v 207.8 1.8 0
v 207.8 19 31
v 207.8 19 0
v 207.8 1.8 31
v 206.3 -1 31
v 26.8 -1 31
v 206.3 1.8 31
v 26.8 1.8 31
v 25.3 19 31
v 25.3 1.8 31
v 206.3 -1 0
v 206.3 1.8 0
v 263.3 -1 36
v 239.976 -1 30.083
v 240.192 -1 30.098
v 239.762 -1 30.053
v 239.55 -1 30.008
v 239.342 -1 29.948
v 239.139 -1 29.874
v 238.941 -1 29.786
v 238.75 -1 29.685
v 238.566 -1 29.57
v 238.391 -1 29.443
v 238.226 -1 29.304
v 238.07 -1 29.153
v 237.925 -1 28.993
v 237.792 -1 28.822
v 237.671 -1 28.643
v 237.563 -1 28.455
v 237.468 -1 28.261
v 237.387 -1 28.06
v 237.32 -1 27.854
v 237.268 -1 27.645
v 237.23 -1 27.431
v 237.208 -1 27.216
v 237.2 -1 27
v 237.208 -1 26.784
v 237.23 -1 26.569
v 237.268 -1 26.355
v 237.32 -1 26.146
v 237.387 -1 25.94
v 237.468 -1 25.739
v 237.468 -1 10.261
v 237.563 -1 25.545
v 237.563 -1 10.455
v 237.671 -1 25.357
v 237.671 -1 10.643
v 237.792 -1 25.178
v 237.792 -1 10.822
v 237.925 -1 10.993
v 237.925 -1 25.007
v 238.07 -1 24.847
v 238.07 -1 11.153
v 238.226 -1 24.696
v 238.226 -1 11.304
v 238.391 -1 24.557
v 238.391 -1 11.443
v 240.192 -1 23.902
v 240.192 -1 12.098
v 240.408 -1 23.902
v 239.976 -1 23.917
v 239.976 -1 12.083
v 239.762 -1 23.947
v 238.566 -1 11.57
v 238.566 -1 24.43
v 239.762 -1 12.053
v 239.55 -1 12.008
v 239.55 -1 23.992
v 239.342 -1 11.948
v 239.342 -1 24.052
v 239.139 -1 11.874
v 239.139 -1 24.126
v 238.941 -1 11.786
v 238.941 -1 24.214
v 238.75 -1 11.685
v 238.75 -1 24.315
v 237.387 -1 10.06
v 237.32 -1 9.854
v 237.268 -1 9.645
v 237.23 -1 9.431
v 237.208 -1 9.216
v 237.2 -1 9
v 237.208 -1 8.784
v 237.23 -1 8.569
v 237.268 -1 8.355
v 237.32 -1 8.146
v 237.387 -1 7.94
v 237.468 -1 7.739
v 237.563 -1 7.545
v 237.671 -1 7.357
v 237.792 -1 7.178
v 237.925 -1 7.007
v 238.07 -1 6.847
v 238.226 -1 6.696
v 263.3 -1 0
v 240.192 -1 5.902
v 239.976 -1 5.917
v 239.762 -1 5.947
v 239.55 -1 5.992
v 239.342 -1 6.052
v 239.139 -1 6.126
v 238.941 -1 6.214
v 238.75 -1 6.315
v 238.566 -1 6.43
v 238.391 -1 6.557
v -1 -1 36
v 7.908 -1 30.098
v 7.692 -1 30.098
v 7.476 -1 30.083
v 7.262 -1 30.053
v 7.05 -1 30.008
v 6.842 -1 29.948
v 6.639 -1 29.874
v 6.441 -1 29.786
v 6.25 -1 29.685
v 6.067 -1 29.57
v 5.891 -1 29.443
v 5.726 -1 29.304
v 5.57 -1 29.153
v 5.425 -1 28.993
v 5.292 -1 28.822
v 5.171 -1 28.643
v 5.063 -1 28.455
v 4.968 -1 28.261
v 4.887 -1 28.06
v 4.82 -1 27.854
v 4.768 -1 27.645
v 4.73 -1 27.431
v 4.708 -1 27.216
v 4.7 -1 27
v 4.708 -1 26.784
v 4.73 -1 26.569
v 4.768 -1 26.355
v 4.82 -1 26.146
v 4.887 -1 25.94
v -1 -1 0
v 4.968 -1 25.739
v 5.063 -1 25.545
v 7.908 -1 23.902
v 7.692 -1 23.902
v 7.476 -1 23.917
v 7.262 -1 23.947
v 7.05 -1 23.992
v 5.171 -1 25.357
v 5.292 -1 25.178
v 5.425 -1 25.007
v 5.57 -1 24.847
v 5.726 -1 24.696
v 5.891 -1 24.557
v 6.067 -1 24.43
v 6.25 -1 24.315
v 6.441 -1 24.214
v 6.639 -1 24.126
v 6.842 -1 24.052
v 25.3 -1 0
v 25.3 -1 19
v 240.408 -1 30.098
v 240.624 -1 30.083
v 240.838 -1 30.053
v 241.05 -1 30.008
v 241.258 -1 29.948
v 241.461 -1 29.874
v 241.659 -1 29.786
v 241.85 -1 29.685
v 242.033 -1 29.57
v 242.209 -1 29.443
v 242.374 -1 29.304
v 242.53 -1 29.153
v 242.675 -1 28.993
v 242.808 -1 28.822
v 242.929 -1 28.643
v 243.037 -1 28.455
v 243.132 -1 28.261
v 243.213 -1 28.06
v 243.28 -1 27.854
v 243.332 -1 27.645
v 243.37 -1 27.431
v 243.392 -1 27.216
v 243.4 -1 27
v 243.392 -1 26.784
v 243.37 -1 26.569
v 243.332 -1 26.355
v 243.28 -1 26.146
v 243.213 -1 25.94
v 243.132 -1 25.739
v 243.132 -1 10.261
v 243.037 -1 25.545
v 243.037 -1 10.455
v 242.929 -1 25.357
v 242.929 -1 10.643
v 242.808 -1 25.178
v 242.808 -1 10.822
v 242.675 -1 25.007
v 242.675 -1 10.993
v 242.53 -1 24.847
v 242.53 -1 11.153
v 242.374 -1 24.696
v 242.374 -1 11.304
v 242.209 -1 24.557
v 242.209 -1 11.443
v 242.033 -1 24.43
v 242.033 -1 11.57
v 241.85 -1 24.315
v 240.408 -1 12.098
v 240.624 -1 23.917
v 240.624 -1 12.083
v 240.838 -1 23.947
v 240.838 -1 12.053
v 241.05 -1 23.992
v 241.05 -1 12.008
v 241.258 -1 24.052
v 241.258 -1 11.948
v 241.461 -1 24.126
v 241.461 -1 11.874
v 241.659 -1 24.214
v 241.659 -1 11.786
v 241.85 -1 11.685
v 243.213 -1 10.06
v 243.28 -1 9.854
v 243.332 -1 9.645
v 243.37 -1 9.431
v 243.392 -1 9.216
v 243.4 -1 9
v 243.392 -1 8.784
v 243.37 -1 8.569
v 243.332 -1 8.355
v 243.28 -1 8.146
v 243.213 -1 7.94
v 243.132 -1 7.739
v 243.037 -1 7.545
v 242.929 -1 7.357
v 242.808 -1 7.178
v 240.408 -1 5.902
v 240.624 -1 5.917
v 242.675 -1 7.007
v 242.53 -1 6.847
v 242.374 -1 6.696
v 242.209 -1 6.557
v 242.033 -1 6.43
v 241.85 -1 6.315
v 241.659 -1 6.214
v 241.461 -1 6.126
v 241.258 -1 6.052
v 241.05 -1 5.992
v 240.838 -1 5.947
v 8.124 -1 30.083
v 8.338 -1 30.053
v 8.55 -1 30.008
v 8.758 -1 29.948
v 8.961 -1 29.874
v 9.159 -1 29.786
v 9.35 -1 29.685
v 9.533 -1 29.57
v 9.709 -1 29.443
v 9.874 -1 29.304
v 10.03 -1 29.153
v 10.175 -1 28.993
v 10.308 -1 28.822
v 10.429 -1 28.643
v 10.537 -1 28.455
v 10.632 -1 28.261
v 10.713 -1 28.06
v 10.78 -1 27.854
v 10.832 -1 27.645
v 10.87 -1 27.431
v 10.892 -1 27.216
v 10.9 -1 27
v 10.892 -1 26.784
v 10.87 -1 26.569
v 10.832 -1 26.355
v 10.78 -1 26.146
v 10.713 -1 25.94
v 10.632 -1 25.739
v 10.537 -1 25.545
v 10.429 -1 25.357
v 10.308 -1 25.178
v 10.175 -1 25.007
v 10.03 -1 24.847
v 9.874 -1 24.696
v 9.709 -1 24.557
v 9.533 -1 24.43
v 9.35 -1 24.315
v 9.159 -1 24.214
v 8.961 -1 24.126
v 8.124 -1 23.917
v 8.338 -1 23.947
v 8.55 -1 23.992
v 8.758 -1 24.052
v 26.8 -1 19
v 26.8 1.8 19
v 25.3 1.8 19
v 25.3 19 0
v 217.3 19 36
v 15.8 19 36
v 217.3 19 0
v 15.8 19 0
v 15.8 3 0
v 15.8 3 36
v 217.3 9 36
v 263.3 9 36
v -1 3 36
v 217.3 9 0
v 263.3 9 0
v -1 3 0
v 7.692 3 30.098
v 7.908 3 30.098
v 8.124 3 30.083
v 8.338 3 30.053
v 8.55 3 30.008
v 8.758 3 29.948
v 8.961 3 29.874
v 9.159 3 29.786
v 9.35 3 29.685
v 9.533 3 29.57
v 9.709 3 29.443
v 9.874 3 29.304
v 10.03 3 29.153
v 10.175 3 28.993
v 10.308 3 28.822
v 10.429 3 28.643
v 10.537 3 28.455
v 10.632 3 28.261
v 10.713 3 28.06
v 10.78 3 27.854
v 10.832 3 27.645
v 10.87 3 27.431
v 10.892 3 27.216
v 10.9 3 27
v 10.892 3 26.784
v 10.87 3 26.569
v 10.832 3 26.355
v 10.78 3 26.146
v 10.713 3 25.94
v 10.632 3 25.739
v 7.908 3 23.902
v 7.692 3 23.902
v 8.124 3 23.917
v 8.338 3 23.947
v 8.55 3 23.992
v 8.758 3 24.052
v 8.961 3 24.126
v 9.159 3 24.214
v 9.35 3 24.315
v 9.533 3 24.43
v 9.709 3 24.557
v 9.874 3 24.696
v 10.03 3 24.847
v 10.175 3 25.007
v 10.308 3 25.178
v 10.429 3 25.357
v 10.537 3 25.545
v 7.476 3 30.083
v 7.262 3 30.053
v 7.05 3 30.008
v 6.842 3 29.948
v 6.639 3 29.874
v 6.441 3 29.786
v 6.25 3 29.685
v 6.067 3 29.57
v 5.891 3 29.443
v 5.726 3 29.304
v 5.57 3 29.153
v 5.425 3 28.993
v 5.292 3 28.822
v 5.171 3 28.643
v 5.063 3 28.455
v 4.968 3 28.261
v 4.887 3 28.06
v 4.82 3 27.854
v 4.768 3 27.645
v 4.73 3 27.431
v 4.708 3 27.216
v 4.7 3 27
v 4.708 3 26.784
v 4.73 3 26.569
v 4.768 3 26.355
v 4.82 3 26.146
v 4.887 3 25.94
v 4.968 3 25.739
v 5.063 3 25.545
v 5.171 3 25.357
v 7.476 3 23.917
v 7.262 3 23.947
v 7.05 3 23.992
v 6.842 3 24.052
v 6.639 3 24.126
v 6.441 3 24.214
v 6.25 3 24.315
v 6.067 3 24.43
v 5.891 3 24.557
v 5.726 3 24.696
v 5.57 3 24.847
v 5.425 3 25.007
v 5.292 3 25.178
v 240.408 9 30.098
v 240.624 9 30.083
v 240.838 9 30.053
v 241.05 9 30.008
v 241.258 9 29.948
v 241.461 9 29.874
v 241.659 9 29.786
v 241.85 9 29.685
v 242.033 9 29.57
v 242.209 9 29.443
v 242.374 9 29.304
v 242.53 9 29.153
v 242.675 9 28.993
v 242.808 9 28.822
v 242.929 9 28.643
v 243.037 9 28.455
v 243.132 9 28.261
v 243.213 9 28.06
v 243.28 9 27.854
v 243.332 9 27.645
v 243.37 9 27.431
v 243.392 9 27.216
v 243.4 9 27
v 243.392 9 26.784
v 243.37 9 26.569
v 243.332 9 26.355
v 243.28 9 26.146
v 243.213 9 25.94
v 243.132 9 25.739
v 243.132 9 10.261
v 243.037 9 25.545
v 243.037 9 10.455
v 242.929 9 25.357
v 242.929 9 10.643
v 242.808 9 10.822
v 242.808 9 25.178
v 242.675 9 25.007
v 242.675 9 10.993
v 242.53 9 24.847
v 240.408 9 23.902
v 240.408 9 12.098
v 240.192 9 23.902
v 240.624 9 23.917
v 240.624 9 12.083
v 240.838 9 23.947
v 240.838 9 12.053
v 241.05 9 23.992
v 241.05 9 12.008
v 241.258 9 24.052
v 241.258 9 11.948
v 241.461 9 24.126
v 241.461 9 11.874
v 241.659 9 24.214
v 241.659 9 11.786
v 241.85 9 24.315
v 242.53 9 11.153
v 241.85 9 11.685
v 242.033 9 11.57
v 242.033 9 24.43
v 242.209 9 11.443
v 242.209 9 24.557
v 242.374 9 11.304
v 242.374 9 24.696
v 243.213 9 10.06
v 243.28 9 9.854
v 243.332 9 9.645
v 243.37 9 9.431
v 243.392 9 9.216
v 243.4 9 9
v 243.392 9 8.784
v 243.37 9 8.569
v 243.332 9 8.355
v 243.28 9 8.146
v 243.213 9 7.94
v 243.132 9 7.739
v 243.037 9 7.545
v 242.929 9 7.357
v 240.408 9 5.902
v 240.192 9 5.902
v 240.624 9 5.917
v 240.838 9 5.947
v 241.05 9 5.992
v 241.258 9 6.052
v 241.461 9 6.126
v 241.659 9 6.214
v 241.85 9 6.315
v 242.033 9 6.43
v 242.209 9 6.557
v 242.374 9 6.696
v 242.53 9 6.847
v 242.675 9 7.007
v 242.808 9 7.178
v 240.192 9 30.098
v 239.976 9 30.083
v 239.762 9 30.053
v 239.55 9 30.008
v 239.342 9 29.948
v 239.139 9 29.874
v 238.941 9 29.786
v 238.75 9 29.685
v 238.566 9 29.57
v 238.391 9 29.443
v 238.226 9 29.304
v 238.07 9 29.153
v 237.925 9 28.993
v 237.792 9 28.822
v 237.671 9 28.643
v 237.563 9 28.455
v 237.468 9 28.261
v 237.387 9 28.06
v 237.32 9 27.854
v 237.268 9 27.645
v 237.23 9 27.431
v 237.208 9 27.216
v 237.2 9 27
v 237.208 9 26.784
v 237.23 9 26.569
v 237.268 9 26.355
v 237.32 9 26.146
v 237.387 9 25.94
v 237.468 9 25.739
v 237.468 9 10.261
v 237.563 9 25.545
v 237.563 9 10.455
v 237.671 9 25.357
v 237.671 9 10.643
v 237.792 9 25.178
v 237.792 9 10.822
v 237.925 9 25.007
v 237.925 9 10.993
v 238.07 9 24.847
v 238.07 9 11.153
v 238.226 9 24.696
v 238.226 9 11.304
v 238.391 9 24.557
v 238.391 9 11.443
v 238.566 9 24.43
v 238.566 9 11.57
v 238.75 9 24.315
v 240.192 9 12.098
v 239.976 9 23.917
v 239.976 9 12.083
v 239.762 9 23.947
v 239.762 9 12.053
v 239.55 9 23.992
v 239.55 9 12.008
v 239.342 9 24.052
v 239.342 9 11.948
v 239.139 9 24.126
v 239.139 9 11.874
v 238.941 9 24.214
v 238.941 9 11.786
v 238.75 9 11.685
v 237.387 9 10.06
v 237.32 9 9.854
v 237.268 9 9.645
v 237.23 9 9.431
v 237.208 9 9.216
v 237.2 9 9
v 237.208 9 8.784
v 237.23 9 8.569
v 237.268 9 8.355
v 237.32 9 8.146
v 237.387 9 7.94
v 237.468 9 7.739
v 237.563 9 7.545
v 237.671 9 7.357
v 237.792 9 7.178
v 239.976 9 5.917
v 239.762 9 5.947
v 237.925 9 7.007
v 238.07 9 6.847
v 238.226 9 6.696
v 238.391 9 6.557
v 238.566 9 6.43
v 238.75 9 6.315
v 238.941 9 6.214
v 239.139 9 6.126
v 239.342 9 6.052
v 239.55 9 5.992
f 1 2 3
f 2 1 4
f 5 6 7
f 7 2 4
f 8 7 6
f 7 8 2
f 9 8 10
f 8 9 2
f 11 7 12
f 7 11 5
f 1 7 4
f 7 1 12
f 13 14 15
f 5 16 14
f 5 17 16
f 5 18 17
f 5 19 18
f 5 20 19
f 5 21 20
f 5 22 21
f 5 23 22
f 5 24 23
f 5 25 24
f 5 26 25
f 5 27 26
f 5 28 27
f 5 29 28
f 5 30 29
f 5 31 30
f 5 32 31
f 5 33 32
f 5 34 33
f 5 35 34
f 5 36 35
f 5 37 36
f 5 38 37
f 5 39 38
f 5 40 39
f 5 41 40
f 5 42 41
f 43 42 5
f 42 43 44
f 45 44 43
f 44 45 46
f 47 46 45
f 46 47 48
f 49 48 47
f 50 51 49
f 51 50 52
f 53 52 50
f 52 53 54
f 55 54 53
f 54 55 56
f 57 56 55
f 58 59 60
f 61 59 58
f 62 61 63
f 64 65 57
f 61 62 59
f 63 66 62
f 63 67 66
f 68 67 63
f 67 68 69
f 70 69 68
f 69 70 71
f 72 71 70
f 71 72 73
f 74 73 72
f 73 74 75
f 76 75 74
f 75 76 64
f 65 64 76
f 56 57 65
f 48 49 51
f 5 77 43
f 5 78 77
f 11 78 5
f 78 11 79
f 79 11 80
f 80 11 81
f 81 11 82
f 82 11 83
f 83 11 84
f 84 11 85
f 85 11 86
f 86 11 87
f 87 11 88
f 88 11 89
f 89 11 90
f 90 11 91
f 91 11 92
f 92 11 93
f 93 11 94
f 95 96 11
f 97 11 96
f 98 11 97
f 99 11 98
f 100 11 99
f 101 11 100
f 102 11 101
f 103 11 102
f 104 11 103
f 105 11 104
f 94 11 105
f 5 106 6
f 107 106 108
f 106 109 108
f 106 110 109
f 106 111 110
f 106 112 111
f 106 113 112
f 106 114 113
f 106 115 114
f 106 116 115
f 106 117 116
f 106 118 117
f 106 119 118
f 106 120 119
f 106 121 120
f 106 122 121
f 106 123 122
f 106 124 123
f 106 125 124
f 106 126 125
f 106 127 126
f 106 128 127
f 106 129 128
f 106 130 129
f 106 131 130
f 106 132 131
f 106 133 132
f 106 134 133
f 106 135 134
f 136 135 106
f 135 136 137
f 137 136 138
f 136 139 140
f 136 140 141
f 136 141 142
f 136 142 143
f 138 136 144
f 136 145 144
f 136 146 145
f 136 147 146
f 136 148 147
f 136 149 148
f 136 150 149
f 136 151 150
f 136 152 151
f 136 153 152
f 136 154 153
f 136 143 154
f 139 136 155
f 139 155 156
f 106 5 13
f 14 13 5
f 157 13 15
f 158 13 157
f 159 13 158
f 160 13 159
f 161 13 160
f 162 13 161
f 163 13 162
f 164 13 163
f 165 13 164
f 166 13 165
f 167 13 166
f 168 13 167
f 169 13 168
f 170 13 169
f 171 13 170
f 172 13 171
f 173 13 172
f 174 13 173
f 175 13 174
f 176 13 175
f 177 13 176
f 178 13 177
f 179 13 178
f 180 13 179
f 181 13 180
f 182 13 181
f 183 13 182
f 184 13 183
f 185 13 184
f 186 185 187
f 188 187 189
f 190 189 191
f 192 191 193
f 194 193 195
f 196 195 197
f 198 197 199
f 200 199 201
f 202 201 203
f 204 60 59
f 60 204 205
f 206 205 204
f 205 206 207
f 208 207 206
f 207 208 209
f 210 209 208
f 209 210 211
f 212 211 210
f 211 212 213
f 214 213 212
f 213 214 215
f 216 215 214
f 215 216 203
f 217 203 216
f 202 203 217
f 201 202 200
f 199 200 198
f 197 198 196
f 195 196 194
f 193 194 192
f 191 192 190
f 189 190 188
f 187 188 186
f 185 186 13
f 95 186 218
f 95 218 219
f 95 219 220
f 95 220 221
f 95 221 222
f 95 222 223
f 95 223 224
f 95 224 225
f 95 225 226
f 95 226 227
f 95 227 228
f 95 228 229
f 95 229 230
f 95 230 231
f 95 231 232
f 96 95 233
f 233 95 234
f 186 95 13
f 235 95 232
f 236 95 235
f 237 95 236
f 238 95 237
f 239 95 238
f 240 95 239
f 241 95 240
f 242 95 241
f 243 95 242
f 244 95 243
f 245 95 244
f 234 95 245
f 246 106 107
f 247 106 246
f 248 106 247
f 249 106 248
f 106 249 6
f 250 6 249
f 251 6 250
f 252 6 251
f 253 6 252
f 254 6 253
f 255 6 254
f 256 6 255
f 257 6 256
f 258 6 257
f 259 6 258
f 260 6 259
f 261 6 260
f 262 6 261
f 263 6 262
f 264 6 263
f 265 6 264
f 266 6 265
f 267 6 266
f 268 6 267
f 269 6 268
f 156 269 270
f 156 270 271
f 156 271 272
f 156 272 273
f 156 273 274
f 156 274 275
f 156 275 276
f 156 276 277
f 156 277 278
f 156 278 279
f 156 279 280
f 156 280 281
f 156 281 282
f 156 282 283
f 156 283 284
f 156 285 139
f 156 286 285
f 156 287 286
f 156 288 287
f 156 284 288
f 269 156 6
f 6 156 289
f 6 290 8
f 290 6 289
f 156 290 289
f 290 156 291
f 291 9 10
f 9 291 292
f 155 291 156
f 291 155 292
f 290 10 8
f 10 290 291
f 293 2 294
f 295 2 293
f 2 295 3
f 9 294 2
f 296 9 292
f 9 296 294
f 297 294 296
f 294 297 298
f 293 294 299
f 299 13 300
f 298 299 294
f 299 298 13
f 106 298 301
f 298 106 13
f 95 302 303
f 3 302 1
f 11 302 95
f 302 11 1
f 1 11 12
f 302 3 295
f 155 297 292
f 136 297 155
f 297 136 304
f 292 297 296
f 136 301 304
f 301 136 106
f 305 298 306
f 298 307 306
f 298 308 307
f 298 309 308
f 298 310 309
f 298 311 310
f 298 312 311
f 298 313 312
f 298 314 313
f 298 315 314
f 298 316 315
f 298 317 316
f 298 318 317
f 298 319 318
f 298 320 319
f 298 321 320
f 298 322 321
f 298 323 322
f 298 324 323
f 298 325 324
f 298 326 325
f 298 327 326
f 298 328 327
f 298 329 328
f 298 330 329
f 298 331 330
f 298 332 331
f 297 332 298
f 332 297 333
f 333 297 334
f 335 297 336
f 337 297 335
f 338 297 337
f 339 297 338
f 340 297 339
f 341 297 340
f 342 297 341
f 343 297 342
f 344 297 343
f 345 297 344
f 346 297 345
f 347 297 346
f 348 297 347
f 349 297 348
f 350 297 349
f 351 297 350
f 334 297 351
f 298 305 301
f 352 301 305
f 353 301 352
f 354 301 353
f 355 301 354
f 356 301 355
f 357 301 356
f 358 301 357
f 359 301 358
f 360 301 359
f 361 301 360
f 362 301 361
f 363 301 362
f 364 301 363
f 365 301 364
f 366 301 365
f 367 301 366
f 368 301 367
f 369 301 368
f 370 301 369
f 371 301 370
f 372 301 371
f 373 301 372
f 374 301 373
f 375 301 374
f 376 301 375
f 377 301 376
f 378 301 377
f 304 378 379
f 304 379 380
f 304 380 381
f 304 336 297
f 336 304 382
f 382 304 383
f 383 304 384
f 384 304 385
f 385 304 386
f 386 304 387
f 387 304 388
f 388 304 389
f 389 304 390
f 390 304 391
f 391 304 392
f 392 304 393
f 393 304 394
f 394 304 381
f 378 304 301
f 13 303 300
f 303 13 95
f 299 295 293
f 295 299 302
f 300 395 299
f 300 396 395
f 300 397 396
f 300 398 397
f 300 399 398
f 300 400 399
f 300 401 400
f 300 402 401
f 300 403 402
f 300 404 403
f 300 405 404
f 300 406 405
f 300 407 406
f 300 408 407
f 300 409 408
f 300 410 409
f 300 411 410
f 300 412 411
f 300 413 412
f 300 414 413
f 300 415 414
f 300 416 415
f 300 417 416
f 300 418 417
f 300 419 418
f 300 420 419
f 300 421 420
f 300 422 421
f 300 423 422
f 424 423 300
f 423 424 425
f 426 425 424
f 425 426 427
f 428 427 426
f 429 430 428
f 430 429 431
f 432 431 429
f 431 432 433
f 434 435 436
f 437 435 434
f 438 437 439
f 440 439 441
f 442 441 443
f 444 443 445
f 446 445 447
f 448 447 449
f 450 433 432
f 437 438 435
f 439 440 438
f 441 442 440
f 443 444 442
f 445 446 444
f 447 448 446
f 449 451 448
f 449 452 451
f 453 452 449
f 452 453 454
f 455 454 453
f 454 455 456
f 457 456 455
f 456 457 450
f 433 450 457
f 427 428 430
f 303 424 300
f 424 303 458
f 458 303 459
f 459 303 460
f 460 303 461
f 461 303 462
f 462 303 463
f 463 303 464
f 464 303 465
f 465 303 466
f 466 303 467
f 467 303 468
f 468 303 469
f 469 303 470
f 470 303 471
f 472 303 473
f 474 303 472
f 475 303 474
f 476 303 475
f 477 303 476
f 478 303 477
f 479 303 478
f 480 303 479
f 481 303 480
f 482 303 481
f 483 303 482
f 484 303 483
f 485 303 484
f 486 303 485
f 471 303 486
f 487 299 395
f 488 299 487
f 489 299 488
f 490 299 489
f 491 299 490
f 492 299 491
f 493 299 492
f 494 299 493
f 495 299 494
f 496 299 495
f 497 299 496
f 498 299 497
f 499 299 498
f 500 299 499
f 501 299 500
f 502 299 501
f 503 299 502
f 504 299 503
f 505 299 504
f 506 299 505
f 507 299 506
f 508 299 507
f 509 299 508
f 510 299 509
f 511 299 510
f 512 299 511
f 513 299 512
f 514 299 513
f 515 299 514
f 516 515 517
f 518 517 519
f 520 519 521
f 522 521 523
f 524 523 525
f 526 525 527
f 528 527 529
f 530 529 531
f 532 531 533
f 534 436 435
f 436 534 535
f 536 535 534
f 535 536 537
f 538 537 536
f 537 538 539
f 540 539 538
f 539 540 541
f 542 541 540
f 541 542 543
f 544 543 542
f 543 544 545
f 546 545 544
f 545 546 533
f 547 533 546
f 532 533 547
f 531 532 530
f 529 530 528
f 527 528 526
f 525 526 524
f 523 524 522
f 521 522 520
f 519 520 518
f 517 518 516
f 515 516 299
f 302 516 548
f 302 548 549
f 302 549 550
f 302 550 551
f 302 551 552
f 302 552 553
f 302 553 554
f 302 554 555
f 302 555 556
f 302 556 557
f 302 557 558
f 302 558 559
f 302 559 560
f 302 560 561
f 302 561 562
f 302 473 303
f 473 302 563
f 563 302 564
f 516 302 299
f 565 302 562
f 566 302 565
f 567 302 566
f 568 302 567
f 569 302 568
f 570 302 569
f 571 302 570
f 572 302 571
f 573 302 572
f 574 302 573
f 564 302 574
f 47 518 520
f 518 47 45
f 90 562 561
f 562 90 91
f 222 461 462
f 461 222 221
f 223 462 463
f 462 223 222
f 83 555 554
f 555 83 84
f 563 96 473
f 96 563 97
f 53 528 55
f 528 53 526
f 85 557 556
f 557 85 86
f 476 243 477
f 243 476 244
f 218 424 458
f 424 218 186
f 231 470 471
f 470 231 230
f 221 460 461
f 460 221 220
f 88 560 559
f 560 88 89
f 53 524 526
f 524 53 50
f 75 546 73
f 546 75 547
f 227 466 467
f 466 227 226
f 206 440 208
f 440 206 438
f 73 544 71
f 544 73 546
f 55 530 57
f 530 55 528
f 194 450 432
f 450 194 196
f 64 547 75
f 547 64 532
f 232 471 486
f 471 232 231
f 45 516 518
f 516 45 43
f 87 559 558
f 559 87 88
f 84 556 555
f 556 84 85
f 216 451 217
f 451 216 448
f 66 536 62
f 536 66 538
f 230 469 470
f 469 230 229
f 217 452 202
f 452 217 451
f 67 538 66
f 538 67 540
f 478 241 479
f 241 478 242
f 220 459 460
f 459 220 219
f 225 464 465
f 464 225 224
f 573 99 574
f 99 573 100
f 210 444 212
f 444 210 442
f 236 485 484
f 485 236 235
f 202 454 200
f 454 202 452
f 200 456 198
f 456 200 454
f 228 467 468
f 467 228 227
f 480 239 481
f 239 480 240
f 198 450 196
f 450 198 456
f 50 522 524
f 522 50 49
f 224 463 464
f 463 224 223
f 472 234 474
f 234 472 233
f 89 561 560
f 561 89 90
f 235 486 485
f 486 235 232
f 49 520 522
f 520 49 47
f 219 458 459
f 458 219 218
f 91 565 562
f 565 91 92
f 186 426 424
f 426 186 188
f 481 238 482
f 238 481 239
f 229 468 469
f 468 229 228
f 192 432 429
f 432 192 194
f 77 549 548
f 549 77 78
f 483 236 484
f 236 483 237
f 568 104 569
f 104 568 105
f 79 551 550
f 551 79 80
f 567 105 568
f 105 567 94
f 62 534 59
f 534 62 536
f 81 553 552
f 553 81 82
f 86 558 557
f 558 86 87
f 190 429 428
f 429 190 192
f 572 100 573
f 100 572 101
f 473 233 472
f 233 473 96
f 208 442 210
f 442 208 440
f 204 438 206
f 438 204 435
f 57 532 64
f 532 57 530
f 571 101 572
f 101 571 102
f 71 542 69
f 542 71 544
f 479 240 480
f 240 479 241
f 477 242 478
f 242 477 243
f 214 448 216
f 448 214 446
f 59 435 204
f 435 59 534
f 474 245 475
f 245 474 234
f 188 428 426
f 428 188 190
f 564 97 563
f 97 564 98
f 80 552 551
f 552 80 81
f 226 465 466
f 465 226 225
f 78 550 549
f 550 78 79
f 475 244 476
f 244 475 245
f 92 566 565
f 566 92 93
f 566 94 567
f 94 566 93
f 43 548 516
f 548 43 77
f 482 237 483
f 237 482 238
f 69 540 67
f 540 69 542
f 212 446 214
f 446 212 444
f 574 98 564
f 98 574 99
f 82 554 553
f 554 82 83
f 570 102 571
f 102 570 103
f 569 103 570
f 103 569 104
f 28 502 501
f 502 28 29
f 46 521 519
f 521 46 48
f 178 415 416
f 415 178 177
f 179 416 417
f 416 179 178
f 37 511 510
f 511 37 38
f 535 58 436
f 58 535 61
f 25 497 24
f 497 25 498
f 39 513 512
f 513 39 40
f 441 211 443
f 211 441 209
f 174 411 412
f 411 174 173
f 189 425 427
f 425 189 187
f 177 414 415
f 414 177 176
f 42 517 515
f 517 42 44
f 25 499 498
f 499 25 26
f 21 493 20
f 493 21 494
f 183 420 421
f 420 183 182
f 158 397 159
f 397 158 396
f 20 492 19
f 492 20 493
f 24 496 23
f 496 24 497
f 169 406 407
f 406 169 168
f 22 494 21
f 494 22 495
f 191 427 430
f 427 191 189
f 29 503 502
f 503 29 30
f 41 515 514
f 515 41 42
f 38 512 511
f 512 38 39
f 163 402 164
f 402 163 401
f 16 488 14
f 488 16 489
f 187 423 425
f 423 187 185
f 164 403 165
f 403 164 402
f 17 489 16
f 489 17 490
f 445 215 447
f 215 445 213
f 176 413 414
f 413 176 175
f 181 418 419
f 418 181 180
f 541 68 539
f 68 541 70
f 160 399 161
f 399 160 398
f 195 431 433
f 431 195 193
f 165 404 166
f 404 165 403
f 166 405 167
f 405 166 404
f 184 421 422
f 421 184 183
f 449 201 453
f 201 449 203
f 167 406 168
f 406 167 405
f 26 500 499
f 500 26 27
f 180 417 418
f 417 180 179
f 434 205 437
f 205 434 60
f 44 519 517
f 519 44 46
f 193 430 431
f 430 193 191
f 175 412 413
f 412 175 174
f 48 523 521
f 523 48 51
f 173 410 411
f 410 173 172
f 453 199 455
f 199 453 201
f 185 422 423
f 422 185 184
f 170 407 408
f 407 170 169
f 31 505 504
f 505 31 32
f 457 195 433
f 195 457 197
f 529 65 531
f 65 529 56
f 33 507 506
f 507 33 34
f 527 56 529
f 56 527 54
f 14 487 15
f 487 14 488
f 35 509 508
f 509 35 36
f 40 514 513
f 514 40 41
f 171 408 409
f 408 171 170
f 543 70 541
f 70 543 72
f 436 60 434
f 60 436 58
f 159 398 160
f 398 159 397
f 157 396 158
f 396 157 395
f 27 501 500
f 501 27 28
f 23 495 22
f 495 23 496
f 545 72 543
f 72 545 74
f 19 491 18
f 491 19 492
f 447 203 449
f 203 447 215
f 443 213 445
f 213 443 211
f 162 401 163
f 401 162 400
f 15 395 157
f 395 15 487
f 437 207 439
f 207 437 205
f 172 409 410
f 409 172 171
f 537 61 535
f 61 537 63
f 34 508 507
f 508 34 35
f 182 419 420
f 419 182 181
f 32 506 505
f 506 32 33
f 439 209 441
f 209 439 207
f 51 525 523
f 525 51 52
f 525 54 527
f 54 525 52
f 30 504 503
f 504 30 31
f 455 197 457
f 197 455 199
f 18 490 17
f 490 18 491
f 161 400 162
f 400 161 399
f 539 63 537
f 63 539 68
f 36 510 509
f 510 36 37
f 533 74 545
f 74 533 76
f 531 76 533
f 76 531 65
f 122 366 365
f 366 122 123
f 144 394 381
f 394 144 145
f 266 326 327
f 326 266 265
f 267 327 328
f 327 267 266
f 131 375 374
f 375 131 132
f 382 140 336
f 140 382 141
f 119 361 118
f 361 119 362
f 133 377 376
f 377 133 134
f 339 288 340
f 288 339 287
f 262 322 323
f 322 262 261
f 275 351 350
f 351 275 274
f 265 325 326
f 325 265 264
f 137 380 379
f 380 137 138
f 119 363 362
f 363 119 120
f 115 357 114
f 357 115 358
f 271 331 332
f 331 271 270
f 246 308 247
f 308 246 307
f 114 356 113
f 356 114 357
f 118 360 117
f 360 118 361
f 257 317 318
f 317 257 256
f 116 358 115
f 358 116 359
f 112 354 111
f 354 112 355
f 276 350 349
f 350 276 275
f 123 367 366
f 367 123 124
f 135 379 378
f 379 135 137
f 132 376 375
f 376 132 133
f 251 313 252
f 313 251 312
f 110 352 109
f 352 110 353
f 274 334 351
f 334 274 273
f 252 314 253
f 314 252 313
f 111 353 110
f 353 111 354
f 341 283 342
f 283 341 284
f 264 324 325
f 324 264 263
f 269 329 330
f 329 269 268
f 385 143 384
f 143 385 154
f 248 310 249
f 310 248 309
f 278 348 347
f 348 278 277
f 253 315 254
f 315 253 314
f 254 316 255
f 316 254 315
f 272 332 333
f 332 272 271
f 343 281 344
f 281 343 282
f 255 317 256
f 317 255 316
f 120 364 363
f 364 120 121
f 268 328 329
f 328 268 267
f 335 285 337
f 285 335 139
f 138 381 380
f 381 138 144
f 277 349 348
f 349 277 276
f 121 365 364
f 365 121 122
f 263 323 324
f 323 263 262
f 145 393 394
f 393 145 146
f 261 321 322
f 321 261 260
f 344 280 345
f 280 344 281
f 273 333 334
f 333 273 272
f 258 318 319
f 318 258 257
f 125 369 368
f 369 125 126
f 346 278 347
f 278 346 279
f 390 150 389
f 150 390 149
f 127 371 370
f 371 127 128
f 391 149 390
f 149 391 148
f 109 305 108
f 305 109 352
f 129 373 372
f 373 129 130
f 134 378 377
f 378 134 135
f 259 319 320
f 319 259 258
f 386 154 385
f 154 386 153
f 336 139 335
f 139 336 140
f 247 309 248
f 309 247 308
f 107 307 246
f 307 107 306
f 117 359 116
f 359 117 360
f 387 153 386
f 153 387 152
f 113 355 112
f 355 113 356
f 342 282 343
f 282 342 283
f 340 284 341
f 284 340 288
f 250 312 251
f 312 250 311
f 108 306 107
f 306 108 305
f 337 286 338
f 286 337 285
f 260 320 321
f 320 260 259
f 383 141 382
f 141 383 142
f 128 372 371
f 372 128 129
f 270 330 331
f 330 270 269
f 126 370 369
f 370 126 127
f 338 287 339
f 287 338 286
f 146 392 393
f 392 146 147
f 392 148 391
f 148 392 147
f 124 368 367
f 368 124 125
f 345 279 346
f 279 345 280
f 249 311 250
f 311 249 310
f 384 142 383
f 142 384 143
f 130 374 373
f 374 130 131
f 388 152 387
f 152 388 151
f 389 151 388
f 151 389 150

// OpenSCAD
// file: ../../../utils/constants.scad
$fn=90;  // accuracy

/* Server dimentions */

// one server unit
c_1u = 44.45;  

// two server unit
c_2u = c_1u*2; // 88.9

// total width
// The total with of the a server rack (19")
// this includes the mounting holes
c_tw  = 482.6; 

// Total inner width
// The distance between the mounting holes in the server rack
c_tiw = 450;


/* Rack hole dimentions */

// width distance rack holes
c_wdrh = 465;

// height distance rack holes
c_hdrh = 33;


/* dell optiplex 7040 micro usff dimentions */

// dell optiplex 7040 height
c_do7040h = 36;

// dell optiplex 7040 width
c_do7040w = 182;

// dell optiplex 7040 depth
c_do7040d = 179;

// dell optiplex 7040 rubber feet width distance
c_do7040rfwd = 14.9;

// dell optiplex 7040 rubber feet back depth distance
c_do7040rfbdd = 9.9;


/* Case dimentions */

// case height outer 
// A small margin is included to so that the case does not 
// exide two server units
c_2ucho = 88.6; 

// case height inner
// The thickness of the walls can then be calculated as (cho-chi)/2
c_2uchi = 76;

// distance between node holes
c_2udbnh = 82.3;

// case width outer
// as there are three parts of the rack server case we just devide
// the total inner width with three 
c_cwo = c_tiw/3; // 150

// case width inner
// Needs to be less than case width outer
c_cwi = 140;

// case depth thickness
// How thick the case should be. It needs to be thicker than the hight
// of the threaded insert.
c_cdt = 30;

// case inner side thickness
// The middle and the side case over lap so that a screw can be entered
// between the two cases. The cist is defined as the thickness of the part
// that does not overlap between the midle and side case.
c_cist = 3.5;

// nodes per case
c_npc = 7;
// file: usff7040-for-bottom-of-rack-module.scad
include <../../../utils/constants.scad>;

module usff7040(a_depth, a_isLeft) {
  m = 0.5; // margin
  bottomMargin = 4;

  sideMountHoleDiameter = 6.2; 
  sideMountWidth = (c_tw - c_tiw)/2;
  sideMountThickness = 4;
  sideThickness = 10;

  topHoleToFloor = 35;//-4;
  topHoleToBottom = topHoleToFloor-bottomMargin;
  topThickness = 5;
  topHoleToTop = topThickness+4;

  sideAttachersWidth = 2.8;
  sideAttachersThickness = 1.5;
  sideAttachersLeftHeight = 12;


  intersectionWidth = c_tiw-(c_do7040w*2+sideThickness*4);
  intersectionHoleDiameter = 6.2;

  height = topHoleToBottom+topThickness; //c_hdrh+topToMountHole;
  width = c_do7040w+sideThickness*2+intersectionWidth+sideMountWidth;


  difference() {
    cube([width, a_depth, height]);

    union() {
      if (a_isLeft) {
        translate([0,sideMountThickness,0])
        cube([sideMountWidth+m, a_depth, height]);

        translate([sideMountWidth+sideThickness,0,-topThickness])
        difference() {
          cube([c_do7040w+m, a_depth, c_do7040h]);

          union() {
            translate([c_do7040w+m-sideAttachersThickness,0,0])
            #cube([sideAttachersThickness, sideAttachersWidth, c_do7040h]);

            translate([0,0,c_do7040h-sideAttachersLeftHeight])
            #cube([sideAttachersThickness, sideAttachersWidth, sideAttachersLeftHeight]);
          }
        }
      }
      else {
        translate([0,-sideMountThickness,0])
        cube([sideMountWidth+m, a_depth, height]);

        translate([sideMountWidth+sideThickness,0,-topThickness])
        difference() {
          cube([c_do7040w+m, a_depth, c_do7040h]);

          union() {
            translate([0,a_depth-sideAttachersWidth,0])
            #cube([sideAttachersThickness, sideAttachersWidth, c_do7040h]);

            translate([c_do7040w+m-sideAttachersThickness,a_depth-sideAttachersWidth,c_do7040h-sideAttachersLeftHeight])
            cube([sideAttachersThickness, sideAttachersWidth, sideAttachersLeftHeight]);
          }
        }
      }

      translate([width-intersectionWidth,a_depth/2,0])
      #cube([intersectionWidth, a_depth, height]);

      translate([width-intersectionWidth/2, a_depth, height/4])
      rotate([90,0,0])
      #cylinder(d=intersectionHoleDiameter, h=a_depth);

      translate([width-intersectionWidth/2, a_depth, height*3/4])
      rotate([90,0,0])
      #cylinder(d=intersectionHoleDiameter, h=a_depth);

      translate([(c_tw-c_wdrh)/2,a_depth,height-topHoleToTop])
      rotate([90,0,0])
      #cylinder(d=sideMountHoleDiameter, h=a_depth);
    }
  }
}

//translate([-1,-1,0])
//usff7040(20,true);

//translate([c_tw,20,0])
//rotate([180,180,0])
//usff7040(20,false);
// main file
use <usff7040-for-bottom-of-rack-module.scad>;
include <../../../utils/constants.scad>;

translate([-1,-1,0])
usff7040(20,true);

//translate([c_tw,20,0])
//rotate([180,180,0])
//usff7040(20,false);
